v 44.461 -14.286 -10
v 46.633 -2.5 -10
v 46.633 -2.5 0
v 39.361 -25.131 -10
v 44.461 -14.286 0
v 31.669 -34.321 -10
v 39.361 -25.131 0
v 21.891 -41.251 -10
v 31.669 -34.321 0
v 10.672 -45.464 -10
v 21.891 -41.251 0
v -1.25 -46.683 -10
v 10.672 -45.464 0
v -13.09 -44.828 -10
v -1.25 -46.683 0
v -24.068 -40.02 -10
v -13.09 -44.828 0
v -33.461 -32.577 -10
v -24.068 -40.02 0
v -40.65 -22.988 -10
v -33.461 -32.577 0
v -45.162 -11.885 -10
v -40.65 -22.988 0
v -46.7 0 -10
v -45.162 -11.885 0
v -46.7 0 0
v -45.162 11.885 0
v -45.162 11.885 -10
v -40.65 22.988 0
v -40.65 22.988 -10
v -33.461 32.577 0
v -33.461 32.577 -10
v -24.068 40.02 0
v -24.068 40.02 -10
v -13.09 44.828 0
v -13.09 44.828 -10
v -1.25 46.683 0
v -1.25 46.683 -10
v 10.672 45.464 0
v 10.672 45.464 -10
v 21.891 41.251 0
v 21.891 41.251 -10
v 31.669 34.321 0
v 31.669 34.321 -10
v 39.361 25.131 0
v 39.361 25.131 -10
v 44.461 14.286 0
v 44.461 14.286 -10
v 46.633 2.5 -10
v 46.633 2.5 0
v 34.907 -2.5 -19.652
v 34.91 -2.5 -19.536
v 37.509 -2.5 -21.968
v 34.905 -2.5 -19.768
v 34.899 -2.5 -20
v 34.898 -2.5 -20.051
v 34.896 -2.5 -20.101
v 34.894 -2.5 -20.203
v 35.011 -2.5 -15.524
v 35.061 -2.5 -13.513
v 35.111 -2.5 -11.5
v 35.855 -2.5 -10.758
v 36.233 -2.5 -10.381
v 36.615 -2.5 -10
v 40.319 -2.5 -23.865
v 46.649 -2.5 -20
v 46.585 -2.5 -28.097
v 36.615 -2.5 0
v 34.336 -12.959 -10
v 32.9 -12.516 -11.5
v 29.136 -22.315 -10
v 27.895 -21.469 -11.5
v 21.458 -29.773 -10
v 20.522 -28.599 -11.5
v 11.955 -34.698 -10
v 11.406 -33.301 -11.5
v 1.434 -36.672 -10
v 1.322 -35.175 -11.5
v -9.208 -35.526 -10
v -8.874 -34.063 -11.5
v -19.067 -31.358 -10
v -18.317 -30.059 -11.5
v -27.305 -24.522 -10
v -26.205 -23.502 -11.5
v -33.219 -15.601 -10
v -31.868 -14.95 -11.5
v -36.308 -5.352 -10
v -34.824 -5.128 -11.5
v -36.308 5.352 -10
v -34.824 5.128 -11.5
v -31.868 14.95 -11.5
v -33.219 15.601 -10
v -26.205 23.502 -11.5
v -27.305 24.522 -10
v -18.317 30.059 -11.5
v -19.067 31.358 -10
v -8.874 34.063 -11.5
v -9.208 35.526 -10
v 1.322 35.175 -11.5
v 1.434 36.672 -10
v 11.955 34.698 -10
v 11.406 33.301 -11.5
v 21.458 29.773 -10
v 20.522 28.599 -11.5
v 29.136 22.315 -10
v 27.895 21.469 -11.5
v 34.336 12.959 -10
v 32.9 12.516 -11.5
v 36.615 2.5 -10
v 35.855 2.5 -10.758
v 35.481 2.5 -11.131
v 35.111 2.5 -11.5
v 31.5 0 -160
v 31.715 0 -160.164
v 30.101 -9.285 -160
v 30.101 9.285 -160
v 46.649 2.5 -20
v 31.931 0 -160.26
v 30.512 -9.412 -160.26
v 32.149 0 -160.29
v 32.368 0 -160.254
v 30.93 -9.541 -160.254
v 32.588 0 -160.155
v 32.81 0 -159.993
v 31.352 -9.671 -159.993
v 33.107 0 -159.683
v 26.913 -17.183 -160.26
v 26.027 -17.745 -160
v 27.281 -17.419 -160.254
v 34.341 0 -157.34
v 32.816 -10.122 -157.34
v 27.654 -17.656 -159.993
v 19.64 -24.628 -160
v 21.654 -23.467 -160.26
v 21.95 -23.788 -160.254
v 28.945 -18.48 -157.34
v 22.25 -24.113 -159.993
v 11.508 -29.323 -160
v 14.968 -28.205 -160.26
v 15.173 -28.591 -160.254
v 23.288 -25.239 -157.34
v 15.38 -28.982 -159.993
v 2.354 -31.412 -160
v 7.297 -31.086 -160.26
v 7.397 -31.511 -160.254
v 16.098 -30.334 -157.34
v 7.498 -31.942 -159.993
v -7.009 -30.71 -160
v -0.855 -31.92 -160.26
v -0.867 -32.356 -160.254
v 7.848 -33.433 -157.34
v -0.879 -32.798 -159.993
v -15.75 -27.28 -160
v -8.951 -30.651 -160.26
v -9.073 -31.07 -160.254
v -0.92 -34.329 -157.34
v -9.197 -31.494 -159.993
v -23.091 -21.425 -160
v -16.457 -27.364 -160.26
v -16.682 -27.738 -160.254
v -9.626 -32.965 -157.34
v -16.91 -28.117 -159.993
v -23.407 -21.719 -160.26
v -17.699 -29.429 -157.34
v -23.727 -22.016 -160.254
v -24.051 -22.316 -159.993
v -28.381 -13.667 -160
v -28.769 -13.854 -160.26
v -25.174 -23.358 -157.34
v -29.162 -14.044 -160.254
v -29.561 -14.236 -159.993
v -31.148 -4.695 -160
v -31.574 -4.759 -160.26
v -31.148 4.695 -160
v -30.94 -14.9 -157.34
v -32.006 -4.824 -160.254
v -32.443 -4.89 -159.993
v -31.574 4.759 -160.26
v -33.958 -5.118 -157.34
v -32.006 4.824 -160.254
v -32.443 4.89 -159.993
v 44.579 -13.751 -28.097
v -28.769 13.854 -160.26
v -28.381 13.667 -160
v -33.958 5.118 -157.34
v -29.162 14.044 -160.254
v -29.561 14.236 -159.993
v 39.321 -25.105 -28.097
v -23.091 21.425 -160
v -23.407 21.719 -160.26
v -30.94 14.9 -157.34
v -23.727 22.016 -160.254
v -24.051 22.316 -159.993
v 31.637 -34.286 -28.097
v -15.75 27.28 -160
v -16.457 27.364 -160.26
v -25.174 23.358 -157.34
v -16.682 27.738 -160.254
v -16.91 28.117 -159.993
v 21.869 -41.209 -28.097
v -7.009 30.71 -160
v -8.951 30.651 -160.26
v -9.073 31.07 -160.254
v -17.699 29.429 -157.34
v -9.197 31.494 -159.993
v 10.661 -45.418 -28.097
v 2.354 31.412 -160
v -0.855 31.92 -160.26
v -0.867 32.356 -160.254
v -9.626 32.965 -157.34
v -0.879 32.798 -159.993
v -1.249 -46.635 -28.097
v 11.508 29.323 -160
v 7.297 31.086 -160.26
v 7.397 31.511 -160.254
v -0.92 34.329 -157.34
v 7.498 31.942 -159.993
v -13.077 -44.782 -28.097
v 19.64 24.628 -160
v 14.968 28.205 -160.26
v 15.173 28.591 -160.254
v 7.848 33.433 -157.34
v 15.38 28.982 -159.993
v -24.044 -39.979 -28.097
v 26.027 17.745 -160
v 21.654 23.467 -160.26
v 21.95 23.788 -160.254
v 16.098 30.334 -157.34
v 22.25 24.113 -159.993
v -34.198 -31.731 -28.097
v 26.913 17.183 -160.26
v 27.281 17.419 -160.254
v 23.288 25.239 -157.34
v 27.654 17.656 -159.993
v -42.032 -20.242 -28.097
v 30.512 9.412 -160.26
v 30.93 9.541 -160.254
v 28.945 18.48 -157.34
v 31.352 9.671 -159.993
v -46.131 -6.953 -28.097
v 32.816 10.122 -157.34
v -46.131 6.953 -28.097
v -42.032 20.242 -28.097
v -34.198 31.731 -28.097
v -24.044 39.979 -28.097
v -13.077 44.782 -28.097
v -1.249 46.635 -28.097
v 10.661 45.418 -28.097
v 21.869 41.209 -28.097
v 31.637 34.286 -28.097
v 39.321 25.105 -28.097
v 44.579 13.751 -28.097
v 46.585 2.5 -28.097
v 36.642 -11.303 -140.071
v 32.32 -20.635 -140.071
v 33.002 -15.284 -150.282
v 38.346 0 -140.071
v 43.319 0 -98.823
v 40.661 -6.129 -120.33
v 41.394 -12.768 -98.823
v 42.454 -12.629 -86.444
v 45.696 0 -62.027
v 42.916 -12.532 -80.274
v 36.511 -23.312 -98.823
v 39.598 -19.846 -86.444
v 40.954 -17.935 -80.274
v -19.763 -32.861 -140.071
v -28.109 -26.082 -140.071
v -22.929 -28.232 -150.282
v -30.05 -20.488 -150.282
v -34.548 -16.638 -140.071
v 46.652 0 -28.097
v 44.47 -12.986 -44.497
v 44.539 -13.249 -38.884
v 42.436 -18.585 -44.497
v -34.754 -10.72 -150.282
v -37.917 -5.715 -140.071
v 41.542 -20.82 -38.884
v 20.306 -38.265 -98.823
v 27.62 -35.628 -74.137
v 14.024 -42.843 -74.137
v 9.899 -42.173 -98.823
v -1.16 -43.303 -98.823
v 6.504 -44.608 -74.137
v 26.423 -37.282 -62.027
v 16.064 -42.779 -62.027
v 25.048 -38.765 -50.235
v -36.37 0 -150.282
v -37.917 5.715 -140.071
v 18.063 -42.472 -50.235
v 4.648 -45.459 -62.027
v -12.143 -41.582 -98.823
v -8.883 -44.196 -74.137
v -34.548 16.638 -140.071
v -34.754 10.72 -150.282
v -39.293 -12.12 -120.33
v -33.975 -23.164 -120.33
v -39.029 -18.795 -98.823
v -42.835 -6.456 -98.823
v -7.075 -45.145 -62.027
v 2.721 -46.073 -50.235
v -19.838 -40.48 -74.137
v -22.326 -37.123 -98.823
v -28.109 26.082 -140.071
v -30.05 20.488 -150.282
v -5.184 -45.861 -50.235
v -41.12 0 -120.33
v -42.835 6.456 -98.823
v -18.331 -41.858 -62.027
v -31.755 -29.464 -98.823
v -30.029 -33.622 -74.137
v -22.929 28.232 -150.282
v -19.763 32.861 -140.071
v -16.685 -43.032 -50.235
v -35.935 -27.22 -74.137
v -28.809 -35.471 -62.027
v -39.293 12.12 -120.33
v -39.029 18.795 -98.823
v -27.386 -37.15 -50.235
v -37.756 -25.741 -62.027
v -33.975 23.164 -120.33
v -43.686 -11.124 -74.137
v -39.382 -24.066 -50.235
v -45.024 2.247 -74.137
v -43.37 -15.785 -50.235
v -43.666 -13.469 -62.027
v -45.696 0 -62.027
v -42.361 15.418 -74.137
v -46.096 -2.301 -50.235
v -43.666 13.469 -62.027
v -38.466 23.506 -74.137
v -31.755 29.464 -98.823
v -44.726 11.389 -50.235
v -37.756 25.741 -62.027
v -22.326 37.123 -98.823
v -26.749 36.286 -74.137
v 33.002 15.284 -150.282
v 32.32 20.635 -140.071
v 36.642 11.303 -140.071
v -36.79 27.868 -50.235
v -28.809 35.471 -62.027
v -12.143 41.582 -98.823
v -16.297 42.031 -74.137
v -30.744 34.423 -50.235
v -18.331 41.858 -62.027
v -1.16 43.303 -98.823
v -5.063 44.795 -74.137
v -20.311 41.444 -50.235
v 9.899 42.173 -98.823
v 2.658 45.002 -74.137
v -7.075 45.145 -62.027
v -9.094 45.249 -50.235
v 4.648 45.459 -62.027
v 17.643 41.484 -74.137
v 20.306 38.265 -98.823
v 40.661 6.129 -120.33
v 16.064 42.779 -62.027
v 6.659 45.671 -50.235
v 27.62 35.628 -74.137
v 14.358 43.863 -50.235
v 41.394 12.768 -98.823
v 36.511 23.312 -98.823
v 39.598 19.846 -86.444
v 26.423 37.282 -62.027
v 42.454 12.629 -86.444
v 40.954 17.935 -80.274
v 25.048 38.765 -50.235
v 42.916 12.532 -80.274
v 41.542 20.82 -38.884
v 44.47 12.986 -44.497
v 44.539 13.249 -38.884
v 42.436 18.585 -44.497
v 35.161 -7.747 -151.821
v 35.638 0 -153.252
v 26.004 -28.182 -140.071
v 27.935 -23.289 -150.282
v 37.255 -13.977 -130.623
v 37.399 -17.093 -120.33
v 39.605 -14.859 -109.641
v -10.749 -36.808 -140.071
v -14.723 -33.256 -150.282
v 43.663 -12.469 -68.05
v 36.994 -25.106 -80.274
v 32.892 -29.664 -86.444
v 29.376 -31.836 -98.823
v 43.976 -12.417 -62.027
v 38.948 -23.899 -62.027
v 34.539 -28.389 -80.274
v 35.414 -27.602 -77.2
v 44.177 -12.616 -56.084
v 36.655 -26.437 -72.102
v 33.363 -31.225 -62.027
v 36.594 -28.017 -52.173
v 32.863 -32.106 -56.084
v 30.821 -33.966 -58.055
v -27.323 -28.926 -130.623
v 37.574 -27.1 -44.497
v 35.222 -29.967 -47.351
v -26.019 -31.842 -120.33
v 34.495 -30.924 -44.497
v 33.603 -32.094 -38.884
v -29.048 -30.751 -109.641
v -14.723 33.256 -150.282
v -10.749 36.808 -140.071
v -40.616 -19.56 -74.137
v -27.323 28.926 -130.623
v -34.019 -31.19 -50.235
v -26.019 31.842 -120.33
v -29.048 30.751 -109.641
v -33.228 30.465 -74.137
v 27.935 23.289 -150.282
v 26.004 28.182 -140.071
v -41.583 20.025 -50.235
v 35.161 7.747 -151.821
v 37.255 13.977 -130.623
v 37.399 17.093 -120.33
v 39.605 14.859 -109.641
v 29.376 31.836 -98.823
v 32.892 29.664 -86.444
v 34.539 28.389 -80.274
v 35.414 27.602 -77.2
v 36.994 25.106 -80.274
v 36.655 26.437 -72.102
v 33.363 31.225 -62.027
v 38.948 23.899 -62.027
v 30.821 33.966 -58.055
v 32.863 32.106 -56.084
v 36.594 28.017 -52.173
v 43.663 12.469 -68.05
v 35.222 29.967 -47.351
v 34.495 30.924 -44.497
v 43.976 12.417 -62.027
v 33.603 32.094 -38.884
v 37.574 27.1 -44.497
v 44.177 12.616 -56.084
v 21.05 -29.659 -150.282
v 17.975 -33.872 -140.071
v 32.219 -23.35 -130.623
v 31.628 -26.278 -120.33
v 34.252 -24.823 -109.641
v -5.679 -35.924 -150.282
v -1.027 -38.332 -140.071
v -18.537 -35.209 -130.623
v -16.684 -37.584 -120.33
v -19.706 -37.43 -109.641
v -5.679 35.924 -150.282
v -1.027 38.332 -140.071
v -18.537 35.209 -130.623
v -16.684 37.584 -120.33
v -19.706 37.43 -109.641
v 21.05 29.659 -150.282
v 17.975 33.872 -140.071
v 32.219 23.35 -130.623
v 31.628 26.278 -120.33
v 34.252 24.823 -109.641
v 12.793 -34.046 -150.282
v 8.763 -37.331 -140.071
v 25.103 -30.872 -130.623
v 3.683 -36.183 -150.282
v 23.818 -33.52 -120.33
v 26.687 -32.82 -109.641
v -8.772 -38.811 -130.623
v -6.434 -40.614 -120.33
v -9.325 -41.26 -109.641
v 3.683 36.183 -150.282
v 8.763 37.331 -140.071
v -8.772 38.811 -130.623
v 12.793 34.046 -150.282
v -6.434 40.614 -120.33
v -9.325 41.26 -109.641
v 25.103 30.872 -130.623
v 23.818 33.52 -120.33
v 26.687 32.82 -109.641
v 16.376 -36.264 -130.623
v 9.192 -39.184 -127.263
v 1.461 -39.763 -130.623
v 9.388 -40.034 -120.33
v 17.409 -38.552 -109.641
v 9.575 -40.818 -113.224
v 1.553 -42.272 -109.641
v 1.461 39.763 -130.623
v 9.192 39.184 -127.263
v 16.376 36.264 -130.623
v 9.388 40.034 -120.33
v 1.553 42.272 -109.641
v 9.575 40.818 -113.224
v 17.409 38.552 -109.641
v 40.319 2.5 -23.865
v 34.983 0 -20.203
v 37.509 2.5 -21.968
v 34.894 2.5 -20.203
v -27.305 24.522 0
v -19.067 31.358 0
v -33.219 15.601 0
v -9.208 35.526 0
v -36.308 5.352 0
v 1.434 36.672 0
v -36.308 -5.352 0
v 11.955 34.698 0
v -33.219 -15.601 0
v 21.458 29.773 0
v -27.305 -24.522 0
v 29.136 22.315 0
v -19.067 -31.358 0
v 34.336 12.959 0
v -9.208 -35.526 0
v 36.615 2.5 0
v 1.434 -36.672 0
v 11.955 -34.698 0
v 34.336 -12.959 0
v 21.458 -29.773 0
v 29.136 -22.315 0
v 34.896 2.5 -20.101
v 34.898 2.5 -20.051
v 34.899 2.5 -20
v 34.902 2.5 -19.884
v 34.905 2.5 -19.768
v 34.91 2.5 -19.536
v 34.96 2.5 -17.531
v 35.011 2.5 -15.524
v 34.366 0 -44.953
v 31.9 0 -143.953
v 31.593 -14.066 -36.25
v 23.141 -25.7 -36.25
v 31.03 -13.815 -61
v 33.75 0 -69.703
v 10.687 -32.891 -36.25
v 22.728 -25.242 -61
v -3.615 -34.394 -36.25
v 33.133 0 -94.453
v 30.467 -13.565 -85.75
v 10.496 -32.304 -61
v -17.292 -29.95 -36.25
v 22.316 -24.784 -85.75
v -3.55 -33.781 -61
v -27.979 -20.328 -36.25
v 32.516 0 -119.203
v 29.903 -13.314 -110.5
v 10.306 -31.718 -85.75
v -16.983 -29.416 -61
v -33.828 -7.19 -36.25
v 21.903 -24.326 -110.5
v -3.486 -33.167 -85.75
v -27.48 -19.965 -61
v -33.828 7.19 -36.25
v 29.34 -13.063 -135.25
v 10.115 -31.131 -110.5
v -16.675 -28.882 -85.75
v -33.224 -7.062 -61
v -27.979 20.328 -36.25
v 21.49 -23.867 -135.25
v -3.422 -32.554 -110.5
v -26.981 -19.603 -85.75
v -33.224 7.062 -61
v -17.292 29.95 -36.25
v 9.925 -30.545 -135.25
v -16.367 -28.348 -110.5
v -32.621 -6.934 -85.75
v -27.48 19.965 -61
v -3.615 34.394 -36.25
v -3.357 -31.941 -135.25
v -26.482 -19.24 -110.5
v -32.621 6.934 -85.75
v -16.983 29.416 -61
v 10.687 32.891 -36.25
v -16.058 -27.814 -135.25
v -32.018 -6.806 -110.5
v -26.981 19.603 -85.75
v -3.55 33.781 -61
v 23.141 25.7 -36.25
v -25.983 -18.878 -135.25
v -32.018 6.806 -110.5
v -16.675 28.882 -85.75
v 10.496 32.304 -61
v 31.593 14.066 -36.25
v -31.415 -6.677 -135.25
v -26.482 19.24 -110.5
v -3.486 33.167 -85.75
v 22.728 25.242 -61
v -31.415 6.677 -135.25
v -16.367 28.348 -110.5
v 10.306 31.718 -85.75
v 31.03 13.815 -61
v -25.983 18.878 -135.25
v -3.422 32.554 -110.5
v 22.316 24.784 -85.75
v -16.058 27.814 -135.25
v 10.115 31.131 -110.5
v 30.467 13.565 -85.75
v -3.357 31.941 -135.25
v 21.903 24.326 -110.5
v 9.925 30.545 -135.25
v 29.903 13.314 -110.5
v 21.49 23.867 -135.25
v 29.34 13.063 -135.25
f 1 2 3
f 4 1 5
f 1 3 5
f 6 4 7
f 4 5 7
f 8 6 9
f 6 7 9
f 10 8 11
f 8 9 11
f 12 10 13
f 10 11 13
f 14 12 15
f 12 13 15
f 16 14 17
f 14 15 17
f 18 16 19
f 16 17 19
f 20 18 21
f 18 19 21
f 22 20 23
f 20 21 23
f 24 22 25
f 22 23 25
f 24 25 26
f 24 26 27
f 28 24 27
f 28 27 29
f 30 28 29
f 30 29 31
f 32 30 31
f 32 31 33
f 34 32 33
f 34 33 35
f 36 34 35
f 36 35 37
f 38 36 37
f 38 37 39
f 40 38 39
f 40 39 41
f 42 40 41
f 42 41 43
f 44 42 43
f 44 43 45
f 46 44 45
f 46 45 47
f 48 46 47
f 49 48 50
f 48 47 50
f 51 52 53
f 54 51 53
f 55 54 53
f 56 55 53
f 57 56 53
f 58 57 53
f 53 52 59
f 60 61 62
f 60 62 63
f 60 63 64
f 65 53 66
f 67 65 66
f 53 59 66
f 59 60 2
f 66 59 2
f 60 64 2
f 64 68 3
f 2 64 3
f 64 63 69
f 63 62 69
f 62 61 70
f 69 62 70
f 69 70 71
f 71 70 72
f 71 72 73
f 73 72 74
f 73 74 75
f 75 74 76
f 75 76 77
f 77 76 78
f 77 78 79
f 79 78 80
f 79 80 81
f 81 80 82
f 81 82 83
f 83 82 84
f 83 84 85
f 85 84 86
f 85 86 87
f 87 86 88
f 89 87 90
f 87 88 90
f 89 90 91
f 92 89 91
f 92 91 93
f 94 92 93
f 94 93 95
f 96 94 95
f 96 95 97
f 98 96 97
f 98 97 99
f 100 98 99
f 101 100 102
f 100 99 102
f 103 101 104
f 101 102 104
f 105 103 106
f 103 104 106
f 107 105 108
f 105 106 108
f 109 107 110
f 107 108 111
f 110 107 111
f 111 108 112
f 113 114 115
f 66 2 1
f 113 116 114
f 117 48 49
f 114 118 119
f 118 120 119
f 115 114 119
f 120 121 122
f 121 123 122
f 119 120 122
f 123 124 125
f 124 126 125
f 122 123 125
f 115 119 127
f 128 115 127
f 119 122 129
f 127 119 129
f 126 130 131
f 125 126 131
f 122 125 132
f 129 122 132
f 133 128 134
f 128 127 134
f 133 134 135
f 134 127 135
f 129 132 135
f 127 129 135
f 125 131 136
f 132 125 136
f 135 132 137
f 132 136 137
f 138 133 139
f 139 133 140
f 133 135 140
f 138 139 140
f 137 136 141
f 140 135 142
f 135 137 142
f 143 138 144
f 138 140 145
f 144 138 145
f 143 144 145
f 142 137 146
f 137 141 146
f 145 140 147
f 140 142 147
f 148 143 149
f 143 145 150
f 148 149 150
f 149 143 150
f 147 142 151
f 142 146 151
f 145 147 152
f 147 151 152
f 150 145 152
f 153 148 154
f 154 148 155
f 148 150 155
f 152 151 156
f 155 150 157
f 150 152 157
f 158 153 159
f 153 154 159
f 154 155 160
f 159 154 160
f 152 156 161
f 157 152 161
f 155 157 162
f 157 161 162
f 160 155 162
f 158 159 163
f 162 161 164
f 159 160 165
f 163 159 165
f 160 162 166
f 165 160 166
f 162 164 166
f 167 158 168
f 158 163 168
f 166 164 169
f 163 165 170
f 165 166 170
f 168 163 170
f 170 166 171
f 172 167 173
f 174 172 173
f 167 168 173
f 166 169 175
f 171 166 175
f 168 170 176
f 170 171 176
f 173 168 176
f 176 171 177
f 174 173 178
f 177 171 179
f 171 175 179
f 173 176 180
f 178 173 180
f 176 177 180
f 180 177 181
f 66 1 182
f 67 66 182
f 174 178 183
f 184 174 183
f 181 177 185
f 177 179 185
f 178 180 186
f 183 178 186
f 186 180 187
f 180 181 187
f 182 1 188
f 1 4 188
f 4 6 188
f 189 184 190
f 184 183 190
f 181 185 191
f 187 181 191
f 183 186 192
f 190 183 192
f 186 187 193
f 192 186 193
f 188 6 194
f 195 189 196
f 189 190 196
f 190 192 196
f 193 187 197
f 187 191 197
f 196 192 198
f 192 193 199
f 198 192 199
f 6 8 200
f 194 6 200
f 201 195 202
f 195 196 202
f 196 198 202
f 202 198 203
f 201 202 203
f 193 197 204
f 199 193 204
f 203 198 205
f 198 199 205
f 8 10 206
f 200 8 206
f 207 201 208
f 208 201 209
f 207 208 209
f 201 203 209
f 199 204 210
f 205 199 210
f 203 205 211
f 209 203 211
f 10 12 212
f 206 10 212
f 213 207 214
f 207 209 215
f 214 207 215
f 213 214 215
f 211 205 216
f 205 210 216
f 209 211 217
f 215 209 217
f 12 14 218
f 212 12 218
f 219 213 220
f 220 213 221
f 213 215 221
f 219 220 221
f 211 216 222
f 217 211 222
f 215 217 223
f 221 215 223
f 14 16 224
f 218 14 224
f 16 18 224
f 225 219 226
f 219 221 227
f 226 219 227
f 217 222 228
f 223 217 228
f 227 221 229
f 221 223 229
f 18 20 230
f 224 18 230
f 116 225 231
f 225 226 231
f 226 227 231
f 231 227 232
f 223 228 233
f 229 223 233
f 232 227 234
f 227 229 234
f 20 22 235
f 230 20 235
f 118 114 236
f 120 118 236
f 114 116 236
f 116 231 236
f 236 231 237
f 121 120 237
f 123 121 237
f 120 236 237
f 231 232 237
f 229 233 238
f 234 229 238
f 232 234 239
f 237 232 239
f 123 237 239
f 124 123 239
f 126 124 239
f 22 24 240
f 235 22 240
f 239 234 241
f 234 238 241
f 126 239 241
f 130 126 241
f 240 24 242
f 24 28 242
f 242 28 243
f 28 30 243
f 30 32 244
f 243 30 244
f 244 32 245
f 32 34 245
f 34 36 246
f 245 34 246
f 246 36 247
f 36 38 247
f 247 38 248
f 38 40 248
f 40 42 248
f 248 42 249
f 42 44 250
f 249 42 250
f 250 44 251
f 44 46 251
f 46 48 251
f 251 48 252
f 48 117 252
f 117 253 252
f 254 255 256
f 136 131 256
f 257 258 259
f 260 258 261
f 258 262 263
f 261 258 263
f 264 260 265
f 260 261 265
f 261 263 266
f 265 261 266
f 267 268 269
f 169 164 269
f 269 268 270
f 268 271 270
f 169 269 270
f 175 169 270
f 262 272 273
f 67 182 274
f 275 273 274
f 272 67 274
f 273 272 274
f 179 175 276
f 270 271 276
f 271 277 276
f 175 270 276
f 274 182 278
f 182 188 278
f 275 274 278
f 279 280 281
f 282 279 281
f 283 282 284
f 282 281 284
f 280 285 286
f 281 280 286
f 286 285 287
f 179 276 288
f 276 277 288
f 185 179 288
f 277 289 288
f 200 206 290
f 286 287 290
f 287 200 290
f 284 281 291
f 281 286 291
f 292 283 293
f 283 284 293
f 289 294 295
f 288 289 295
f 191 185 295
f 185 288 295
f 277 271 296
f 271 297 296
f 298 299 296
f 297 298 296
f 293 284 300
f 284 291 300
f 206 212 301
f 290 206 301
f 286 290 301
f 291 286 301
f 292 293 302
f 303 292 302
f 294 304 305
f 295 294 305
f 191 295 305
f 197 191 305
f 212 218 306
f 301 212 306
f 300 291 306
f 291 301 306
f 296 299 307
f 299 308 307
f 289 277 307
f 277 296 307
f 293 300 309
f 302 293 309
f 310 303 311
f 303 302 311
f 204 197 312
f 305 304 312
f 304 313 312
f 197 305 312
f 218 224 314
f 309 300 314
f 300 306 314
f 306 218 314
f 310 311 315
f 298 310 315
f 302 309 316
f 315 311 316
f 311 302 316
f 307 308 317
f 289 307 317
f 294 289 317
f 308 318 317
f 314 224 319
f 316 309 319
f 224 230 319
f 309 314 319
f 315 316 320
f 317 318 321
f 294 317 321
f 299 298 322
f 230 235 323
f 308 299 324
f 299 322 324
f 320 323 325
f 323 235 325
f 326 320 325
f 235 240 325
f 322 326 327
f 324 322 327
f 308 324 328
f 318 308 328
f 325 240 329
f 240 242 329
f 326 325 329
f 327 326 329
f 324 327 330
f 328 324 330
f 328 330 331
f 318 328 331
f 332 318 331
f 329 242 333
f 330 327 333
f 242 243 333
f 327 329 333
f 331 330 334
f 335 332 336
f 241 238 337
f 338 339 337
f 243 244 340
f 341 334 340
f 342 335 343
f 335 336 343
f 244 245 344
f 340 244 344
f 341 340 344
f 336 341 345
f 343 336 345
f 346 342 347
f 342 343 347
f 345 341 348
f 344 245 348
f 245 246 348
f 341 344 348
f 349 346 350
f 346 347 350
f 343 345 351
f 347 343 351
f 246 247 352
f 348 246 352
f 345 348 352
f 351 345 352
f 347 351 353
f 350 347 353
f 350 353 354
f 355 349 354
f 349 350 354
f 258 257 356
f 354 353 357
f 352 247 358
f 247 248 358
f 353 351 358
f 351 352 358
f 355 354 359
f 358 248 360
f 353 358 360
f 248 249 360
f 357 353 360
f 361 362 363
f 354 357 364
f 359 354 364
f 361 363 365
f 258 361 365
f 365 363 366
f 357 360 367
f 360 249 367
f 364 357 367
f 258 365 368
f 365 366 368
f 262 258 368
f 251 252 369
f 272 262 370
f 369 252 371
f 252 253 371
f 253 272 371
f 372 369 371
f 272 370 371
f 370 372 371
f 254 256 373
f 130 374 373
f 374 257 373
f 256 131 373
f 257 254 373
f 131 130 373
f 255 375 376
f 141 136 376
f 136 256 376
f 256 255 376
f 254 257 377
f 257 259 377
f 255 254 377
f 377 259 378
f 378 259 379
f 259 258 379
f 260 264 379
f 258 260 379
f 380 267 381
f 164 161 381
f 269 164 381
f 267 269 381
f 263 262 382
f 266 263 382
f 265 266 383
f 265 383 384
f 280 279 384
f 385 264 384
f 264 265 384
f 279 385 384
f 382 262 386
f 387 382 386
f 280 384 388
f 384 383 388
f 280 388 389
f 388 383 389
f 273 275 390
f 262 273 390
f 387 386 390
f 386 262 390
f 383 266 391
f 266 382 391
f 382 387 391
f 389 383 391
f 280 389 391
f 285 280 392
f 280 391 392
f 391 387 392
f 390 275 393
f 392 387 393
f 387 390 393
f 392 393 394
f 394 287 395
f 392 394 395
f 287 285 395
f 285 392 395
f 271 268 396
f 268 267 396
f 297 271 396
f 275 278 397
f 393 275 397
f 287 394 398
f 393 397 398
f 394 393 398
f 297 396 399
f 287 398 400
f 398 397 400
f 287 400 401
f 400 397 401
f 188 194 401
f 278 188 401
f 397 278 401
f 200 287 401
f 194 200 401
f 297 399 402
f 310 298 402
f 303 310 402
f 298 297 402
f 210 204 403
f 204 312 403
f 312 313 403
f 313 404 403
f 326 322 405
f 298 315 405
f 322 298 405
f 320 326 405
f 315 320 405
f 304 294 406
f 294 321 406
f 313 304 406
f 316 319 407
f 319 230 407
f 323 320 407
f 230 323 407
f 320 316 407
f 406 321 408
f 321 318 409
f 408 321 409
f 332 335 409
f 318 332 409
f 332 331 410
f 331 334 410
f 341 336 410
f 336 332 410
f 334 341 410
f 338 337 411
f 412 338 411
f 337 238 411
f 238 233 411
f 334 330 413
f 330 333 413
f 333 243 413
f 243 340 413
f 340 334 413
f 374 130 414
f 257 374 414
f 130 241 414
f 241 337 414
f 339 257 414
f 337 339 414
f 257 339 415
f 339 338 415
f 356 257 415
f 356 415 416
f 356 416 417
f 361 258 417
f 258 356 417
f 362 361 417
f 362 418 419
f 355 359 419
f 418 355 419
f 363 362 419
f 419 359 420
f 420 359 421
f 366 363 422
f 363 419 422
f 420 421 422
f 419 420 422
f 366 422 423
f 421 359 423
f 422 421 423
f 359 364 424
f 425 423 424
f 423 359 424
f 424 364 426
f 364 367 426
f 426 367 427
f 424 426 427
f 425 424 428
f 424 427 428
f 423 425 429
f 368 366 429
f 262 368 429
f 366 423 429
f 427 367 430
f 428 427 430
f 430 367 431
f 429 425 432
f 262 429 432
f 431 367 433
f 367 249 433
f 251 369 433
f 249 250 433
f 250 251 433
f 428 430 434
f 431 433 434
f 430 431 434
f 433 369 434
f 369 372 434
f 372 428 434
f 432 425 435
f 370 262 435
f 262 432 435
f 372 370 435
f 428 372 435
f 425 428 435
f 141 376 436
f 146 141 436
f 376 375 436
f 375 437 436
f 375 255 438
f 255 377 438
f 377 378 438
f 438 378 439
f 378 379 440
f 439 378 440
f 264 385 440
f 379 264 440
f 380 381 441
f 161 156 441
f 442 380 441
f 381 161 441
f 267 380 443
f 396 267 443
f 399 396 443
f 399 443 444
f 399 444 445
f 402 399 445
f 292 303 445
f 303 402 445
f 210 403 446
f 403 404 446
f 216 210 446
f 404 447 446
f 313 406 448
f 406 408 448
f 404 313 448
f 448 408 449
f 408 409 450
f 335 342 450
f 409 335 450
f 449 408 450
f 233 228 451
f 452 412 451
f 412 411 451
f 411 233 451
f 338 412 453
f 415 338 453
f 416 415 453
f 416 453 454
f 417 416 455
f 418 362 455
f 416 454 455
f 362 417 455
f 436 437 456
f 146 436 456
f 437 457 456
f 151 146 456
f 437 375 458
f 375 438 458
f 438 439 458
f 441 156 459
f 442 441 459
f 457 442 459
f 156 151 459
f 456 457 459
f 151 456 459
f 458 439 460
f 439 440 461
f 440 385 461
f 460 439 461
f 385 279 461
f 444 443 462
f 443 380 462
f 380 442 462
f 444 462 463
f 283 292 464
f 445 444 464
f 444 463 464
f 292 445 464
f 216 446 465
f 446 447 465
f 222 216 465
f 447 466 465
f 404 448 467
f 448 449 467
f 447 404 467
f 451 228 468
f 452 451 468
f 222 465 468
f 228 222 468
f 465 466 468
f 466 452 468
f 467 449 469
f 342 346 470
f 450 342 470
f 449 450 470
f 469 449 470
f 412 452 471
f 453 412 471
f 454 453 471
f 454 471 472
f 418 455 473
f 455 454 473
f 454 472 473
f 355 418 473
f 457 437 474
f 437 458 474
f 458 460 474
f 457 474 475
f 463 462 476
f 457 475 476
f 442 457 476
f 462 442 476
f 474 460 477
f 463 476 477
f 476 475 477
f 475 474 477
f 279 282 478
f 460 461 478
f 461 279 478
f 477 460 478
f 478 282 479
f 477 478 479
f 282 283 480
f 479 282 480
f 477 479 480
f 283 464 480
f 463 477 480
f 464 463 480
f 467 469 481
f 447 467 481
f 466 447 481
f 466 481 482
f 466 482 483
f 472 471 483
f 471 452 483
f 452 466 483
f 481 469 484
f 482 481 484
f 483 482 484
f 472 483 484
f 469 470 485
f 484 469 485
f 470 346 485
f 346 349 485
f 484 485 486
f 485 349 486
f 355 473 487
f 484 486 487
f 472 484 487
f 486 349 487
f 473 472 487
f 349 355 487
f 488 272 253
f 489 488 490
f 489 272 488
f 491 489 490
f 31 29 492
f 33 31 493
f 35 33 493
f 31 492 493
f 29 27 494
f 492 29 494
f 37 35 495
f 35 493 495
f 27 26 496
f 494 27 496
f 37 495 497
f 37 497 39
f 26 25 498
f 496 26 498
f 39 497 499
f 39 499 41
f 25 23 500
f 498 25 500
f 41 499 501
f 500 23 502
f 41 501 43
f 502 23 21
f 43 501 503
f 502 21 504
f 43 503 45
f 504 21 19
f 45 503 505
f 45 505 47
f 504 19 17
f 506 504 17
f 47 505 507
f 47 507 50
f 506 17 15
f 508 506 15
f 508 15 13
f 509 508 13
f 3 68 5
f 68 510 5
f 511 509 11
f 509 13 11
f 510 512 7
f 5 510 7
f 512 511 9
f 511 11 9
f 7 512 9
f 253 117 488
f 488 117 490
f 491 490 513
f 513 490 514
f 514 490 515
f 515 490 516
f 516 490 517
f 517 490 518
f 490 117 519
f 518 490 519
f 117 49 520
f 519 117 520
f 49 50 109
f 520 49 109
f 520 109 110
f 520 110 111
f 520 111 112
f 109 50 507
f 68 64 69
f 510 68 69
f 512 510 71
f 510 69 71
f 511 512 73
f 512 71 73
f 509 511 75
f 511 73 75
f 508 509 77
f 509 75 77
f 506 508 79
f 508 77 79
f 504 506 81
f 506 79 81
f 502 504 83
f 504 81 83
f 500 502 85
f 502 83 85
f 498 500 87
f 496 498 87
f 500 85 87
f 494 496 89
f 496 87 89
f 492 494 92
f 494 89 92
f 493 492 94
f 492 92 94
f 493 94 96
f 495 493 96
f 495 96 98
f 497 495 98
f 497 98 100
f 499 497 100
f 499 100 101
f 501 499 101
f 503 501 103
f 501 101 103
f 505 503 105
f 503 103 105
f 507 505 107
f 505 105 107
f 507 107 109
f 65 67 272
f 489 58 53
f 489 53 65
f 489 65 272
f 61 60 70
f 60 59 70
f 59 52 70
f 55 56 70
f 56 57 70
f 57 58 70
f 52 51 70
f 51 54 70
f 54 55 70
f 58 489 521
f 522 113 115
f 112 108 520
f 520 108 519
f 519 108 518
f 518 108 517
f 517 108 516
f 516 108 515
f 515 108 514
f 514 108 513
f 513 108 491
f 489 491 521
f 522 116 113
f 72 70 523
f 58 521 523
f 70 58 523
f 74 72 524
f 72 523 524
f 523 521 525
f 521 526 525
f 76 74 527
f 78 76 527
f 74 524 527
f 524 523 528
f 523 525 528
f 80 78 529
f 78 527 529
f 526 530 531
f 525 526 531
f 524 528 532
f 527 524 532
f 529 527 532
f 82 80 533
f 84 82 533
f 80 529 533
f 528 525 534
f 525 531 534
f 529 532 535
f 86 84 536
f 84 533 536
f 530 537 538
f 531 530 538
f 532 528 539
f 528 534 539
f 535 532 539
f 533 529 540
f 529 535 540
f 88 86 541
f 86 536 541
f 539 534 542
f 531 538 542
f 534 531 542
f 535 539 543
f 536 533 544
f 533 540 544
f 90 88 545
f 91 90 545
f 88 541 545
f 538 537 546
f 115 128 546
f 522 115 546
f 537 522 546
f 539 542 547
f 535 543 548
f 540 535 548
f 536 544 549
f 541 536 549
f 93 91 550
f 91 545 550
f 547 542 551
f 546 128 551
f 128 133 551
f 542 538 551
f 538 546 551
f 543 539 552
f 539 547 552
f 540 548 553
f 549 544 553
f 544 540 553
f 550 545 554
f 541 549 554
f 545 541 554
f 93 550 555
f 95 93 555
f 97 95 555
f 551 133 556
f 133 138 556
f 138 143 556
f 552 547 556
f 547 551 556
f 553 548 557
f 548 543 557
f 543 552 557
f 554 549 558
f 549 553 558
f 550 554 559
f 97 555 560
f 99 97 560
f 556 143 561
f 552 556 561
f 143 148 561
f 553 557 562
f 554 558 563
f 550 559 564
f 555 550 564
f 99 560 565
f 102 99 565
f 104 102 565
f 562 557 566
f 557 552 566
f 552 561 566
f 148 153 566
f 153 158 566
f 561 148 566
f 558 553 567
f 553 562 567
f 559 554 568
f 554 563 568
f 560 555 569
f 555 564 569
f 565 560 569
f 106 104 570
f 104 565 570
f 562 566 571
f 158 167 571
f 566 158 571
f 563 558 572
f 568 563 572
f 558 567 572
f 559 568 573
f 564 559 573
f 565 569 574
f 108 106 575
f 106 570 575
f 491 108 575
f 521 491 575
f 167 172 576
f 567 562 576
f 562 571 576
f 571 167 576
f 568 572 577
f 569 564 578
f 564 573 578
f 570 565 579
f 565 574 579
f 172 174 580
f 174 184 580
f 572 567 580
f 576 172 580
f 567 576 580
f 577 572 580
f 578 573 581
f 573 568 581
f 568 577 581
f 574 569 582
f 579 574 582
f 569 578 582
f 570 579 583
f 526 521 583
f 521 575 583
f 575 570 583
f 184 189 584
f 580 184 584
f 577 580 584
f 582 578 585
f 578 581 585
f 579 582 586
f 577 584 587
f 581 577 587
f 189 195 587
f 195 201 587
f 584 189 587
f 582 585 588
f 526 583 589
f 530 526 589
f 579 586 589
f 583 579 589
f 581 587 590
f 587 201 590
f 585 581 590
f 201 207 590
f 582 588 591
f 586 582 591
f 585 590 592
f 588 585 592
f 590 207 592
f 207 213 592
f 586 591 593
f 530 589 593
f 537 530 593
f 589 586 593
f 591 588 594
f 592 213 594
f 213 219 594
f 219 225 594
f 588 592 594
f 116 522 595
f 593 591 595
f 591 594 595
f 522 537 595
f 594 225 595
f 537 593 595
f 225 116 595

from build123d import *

# Parameters (mm, degrees)
F3_DEPTH    = 20
F4_T4_ANGLE = 41.1903305593
F4_T9_ANGLE = 41.1903607256


# Not quite as in the source:
# - a fillet or chamfer that OpenCascade refuses, or shapes differently, is made with other operations: its cross-section is extruded or revolved along the edge and cut away or added


with BuildPart() as f1:
    # F0 (on Front) → F1 (revolve)
    with BuildSketch(Plane.XZ):
        with BuildLine():
            Line((46.7, 0), (36.7, 0))
            Line((36.7, 0), (36.7, -10))
            Line((36.7, -10), (35.2, -11.5))
            Line((35.2, -11.5), (31.5, -160))
            add(Edge.make_bspline(
                [(31.5, -160), (34.9205158198, -163.1733860852), (45.1526020923, -104.4093913174), (46.8983203173, -37.4636948109), (46.7, -10)],
                knots=[0, 0, 0, 0, 0.3982770084, 1, 1, 1, 1], degree=3))
            Line((46.7, -10), (46.7, 0))
        make_face()
    revolve(axis=Axis((0, 0, -79.1394754779), (0, 0, -1)))

    # F2 (on face) → F3 (cut)
    with BuildSketch(Plane.XY):
        with BuildLine():
            ThreePointArc((46.6330355006, 2.5), (46.6832558734, 1.250448344), (46.7, 0))
            ThreePointArc((46.7, 0), (46.6832558734, -1.250448344), (46.6330355006, -2.5))
            Line((46.6330355006, -2.5), (51.9782938063, -2.5))
            Line((51.9782938063, -2.5), (51.9782938063, 2.5))
            Line((51.9782938063, 2.5), (46.6330355006, 2.5))
        make_face()
        with BuildLine():
            ThreePointArc((46.6330355006, -2.5), (46.6832558734, -1.250448344), (46.7, 0))
            ThreePointArc((46.7, 0), (46.6832558734, 1.250448344), (46.6330355006, 2.5))
            Line((46.6330355006, 2.5), (36.6147511257, 2.5))
            ThreePointArc((36.6147511257, 2.5), (36.6786815897, 1.2507265259), (36.7, 0))
            ThreePointArc((36.7, 0), (36.6786815897, -1.2507265259), (36.6147511257, -2.5))
            Line((36.6147511257, -2.5), (46.6330355006, -2.5))
        make_face()
        with BuildLine():
            ThreePointArc((36.7, 0), (36.6786815897, 1.2507265259), (36.6147511257, 2.5))
            Line((36.6147511257, 2.5), (32.3731712997, 2.5))
            Line((32.3731712997, 2.5), (32.3731712997, -2.5))
            Line((32.3731712997, -2.5), (36.6147511257, -2.5))
            ThreePointArc((36.6147511257, -2.5), (36.6786815897, -1.2507265259), (36.7, 0))
        make_face()
    extrude(amount=-F3_DEPTH, mode=Mode.SUBTRACT)

    # F4: chamfer of 12 x 8 on 2 edges, made by hand


with BuildPart() as f4_tool2:
    # F4_s3 → F4_t4 (revolve)
    with BuildSketch(Plane(origin=(-7.0888e-06, -8.1003e-06, 0), x_dir=(0, 0, 1), z_dir=(-0.6585624812, -0.7525260516, 0))):
        with BuildLine():
            Line((-28.3661524227, -47.0496779531), (-19.7310392649, -34.2855747254))
            Line((-19.7310392649, -34.2855747254), (-19.4910392649, -34.2855747254))
            ThreePointArc((-19.4910392649, -34.2855747254), (-19.76, -40.500764232), (-19.76, -46.7159537386))
            Line((-19.76, -46.7159537386), (-20.0009080776, -46.9559520207))
            ThreePointArc((-20.0009080776, -46.9559520207), (-24.1834649208, -46.9311818232), (-28.3690103838, -47.2896609359))
            Line((-28.3690103838, -47.2896609359), (-28.3661524227, -47.0496779531))
        make_face()
    revolve(axis=Axis((-1.71008e-05, 6.615e-07, -20), (0, 0, 1)), revolution_arc=F4_T4_ANGLE)

    split(bisect_by=Plane.XZ.offset(2.5), keep=Keep.BOTTOM)


with BuildPart() as f1_1:
    add(f1.part)

    # F4_t1: cut F4_tool2
    add(f4_tool2.part, mode=Mode.SUBTRACT)


with BuildPart() as f4_tool7:
    # F4_s8 → F4_t9 (revolve)
    with BuildSketch(Plane.XZ.offset(-2.542e-07)):
        with BuildLine():
            Line((47.0496741445, -28.3661524227), (34.2855709168, -19.7310392649))
            Line((34.2855709168, -19.7310392649), (34.2855709168, -19.4910392649))
            ThreePointArc((34.2855709168, -19.4910392649), (40.5007604241, -19.76), (46.7159499314, -19.76))
            Line((46.7159499314, -19.76), (46.9559482135, -20.0009080776))
            ThreePointArc((46.9559482135, -20.0009080776), (46.9311780146, -24.1834649208), (47.2896571273, -28.3690103838))
            Line((47.2896571273, -28.3690103838), (47.0496741445, -28.3661524227))
        make_face()
    revolve(axis=Axis((1.70968e-05, 2.542e-07, -20), (0, 0, 1)), revolution_arc=F4_T9_ANGLE)

    split(bisect_by=Plane.XZ.offset(-2.5), keep=Keep.TOP)


with BuildPart() as f1_2:
    add(f1_1.part)

    # F4_t6: cut F4_tool7
    add(f4_tool7.part, mode=Mode.SUBTRACT)


solid = f1_2.part
